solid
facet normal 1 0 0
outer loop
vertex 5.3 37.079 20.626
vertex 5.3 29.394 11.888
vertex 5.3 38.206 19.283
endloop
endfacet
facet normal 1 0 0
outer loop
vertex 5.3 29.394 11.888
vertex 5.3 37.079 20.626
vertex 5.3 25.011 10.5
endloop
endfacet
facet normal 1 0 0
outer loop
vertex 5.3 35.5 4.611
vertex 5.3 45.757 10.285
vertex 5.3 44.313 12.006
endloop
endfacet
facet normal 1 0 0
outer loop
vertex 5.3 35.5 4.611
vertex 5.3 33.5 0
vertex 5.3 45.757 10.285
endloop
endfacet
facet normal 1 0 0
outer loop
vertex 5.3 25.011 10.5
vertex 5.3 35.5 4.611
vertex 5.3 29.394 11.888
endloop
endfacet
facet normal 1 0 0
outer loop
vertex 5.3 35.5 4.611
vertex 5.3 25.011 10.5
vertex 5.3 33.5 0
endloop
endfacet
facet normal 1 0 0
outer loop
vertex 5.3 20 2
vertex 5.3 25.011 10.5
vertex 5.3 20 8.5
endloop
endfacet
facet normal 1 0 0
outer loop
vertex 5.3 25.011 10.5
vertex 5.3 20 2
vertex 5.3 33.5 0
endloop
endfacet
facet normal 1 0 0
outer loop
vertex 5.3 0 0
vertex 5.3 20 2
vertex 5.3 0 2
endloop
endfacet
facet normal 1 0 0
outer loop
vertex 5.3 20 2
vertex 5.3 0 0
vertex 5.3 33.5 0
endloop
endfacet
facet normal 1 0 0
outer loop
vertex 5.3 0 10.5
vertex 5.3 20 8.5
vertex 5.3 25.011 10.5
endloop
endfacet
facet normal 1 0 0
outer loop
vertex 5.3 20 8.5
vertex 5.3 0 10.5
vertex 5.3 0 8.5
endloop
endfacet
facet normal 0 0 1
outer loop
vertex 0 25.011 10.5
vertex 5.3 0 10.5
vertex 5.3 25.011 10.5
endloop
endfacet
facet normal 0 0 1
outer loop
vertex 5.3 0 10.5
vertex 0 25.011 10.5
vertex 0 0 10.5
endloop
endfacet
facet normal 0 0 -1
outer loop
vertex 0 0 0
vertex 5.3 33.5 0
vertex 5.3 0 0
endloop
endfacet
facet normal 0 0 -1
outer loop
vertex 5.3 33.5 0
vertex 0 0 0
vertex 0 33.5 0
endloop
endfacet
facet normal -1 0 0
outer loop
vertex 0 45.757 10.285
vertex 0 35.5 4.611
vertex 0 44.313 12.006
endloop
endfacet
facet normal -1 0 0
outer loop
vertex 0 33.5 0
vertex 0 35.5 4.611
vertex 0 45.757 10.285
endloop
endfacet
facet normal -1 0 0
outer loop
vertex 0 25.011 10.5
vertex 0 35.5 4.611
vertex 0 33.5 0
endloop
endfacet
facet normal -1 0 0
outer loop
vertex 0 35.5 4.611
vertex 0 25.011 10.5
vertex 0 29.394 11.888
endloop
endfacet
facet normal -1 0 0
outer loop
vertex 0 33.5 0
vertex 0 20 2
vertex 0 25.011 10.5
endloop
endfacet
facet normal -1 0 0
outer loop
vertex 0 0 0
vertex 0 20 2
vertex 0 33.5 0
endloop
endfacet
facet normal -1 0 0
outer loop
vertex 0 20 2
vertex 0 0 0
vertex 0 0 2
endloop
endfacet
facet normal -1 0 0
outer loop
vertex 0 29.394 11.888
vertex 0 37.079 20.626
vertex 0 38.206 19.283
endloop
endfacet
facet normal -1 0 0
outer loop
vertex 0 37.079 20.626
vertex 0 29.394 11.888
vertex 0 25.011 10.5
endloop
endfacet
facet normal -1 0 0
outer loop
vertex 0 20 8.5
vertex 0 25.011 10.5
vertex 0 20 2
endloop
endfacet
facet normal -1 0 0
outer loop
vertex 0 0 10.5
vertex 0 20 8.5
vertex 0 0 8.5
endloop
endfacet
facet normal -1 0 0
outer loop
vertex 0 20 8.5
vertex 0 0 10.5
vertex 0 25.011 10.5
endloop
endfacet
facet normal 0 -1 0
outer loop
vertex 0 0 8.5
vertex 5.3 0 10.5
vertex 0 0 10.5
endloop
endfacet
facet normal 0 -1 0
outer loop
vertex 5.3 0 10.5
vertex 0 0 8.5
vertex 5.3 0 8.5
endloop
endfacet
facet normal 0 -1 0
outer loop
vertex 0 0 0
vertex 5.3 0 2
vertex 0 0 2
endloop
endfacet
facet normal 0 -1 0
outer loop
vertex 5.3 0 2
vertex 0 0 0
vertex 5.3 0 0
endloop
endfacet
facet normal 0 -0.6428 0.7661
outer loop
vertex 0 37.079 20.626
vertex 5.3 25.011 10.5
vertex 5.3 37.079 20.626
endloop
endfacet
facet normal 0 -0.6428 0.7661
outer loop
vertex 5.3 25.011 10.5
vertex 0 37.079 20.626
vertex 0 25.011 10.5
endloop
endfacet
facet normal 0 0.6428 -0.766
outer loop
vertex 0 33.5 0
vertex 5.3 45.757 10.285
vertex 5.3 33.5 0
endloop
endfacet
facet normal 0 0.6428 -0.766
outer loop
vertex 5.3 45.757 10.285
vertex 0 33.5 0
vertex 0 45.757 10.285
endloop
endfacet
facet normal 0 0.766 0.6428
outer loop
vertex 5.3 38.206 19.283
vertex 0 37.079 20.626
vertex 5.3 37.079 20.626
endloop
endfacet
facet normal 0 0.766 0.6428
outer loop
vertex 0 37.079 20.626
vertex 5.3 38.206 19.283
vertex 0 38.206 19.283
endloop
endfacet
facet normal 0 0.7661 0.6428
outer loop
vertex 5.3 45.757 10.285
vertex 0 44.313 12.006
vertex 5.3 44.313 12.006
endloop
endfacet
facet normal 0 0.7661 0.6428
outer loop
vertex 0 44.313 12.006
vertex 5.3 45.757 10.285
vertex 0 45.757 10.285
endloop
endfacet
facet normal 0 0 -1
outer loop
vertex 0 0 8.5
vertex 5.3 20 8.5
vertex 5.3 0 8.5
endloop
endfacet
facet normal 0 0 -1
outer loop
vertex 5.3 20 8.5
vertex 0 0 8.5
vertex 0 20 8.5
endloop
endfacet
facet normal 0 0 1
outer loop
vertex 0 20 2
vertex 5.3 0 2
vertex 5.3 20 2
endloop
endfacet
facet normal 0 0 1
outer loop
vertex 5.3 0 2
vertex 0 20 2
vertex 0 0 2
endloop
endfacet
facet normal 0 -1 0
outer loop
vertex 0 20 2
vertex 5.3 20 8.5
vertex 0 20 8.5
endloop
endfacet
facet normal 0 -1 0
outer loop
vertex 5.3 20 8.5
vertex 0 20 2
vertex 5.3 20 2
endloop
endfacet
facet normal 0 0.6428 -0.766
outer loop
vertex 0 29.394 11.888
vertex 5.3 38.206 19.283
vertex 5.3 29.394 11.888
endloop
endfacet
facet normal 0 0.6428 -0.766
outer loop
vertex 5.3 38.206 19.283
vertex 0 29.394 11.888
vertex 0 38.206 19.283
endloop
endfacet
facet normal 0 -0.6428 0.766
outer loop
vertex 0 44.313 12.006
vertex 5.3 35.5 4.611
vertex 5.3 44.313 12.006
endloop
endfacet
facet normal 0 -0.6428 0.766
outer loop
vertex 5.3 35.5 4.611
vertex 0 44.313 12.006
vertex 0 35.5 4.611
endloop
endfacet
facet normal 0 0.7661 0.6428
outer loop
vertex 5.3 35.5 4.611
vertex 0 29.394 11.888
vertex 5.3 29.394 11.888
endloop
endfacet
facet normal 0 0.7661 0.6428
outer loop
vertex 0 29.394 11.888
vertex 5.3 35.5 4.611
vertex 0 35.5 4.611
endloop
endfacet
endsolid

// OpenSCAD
x = 5.3;
y = 20;
z = 6.5;
mobile_y = 16;
mobile_z = 9.5;
angle = 40;
thick = 2;

difference() {
	union() {
		cube([x, y + mobile_z + 2*thick, z + 2*thick]);
		translate([0, y + mobile_z + 2*thick, 0]) rotate([angle, 0, 0]) cube([x, mobile_y, mobile_z + 2*thick]);
	}
	union() {
		translate([-1, -1, thick]) cube([x + 2, y + 1, z]);
		translate([-1, y + mobile_z + 3*thick, (thick / cos(angle)) + thick]) rotate([angle, 0, 0]) cube([x + 2, mobile_y + 1, mobile_z]);
	}
}
